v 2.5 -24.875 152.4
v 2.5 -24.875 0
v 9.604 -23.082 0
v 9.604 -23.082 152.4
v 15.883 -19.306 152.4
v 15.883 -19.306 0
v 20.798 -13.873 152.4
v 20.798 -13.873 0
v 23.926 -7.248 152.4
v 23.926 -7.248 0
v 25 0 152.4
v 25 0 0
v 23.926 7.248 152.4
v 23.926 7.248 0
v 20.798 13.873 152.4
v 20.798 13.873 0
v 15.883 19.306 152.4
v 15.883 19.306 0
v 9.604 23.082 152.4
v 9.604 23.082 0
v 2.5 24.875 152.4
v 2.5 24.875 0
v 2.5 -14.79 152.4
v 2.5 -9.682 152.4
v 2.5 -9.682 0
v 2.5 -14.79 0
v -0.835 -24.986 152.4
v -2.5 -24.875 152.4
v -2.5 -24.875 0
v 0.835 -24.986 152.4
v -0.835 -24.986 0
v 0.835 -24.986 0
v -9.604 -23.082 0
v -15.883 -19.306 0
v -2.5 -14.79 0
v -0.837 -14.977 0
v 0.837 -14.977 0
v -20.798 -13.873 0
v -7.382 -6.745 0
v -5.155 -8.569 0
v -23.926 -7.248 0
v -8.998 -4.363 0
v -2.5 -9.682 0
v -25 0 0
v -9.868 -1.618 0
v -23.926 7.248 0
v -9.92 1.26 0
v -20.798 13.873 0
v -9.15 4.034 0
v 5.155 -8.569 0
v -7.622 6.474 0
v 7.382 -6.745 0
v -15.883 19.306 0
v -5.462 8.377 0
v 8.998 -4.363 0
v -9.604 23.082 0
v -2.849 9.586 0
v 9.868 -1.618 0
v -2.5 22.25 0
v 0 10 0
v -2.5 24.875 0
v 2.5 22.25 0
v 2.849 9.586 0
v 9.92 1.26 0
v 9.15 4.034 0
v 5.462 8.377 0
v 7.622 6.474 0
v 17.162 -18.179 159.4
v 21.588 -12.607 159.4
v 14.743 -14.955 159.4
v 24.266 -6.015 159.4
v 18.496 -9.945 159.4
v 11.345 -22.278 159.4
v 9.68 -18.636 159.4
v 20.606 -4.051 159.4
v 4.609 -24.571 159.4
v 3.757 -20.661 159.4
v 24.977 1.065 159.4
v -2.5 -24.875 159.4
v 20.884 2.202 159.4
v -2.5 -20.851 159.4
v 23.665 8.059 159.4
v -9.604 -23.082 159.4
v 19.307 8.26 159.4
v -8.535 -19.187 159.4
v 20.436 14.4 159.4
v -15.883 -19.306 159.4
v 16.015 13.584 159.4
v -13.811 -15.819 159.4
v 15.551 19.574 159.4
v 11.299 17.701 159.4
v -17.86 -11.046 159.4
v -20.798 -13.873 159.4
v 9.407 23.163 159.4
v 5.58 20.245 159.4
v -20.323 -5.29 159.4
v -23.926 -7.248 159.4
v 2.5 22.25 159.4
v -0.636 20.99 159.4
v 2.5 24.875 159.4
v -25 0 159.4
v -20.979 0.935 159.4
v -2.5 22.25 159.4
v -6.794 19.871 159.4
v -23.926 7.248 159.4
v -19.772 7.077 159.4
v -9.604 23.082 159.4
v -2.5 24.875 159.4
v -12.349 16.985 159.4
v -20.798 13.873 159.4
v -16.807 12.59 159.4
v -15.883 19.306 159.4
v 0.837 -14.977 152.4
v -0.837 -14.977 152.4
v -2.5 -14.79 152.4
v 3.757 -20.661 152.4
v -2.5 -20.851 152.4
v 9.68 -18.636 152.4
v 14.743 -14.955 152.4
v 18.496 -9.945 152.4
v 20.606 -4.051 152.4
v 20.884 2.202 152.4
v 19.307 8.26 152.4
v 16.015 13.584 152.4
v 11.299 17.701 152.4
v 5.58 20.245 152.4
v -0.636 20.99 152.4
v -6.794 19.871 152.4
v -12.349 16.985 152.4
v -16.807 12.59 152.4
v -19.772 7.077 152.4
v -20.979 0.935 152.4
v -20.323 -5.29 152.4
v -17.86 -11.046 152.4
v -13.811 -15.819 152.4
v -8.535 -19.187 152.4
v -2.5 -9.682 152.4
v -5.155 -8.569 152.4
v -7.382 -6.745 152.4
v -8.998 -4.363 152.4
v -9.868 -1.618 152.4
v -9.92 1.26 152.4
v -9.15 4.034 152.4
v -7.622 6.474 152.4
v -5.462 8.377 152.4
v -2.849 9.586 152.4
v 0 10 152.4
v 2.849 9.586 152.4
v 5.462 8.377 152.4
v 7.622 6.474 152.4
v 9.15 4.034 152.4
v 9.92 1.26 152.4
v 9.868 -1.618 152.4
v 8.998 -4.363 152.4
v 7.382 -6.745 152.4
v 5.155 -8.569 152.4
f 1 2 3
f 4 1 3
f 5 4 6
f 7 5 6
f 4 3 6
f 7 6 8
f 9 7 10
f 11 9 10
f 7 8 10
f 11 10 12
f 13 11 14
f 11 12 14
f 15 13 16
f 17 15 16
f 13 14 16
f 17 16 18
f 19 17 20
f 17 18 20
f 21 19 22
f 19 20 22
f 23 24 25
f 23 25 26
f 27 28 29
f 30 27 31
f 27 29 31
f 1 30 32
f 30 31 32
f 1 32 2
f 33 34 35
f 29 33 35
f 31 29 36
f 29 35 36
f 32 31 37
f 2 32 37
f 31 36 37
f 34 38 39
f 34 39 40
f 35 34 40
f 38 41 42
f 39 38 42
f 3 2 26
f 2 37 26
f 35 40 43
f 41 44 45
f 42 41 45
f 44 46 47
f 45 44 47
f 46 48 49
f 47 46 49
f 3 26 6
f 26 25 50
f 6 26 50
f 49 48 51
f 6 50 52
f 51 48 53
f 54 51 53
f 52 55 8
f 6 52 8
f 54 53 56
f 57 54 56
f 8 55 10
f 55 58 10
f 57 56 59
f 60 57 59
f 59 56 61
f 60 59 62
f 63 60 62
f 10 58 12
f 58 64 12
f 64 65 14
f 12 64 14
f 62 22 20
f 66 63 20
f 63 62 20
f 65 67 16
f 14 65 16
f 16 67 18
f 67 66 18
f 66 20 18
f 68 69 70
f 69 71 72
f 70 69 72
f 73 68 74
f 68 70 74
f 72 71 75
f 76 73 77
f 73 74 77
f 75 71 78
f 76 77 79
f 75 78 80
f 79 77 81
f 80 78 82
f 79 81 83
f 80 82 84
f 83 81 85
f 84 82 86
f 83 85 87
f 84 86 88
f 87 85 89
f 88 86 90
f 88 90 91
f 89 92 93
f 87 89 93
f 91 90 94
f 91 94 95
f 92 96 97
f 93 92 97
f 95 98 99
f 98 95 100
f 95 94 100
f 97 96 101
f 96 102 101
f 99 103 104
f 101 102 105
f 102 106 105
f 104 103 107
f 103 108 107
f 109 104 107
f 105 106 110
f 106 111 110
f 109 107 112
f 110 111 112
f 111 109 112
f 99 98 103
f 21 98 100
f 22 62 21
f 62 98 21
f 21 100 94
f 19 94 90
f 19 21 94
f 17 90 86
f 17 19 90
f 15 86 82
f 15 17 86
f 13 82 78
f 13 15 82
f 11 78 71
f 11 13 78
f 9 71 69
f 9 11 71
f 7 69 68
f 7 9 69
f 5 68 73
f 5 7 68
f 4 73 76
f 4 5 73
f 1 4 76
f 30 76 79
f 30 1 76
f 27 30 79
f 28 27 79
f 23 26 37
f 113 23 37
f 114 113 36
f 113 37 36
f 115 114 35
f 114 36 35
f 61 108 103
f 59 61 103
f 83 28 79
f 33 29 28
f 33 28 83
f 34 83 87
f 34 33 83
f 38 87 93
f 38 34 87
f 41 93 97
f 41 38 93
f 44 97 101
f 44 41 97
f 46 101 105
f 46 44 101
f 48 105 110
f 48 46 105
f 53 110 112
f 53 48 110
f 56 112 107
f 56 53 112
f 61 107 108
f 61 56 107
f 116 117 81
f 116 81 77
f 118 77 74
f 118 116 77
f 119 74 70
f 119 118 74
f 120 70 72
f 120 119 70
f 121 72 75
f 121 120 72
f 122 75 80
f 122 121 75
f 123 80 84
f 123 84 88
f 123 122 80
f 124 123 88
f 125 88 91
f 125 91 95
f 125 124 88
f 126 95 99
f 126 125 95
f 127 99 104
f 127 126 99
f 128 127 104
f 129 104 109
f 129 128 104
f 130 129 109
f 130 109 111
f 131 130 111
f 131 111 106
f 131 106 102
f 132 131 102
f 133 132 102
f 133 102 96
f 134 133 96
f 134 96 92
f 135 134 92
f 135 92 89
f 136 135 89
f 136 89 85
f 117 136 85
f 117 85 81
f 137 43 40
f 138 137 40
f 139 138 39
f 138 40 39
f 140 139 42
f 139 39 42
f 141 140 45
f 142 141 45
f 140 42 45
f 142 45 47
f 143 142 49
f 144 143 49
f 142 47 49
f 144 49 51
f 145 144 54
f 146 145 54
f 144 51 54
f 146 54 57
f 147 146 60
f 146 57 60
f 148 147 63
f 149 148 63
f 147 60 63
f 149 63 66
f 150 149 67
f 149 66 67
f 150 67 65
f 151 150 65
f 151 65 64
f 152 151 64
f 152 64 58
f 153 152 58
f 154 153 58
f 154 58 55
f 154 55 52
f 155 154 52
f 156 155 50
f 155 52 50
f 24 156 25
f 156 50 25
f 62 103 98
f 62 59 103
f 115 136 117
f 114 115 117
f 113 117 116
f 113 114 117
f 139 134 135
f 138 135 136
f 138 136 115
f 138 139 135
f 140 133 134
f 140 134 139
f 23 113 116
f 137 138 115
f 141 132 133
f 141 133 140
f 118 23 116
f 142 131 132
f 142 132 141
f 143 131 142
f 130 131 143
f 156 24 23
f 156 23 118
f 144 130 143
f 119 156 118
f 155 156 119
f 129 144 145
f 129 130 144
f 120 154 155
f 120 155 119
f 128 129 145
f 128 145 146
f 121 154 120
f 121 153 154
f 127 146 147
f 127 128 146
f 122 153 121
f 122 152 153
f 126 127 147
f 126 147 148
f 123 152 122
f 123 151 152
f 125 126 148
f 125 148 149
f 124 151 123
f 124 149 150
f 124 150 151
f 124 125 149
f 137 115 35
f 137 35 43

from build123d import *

# Parameters (mm, degrees)
BOSS_EXTRUDE1_DEPTH = 152.4
SKETCH3_R           = 21
BOSS_EXTRUDE2_DEPTH = 7
BOSS_EXTRUDE3_START = -152.4
BOSS_EXTRUDE3_DEPTH = 152.4


with BuildPart() as part:
    # Sketch1 → Boss-Extrude1 (new body)
    with BuildSketch(Plane.XY):
        with BuildLine():
            Line((-2.5, 22.25), (-2.5, 24.874685928))
            ThreePointArc((-2.5, 24.874685928), (-25, 0), (-2.5, -24.874685928))
            Line((-2.5, -24.874685928), (-2.5, -9.682458366))
            ThreePointArc((-2.5, -9.682458366), (0, 10), (2.5, -9.682458366))
            Line((2.5, -9.682458366), (2.5, -24.874685928))
            ThreePointArc((2.5, -24.874685928), (25, 0), (2.5, 24.874685928))
            Line((2.5, 24.874685928), (2.5, 22.25))
            Line((2.5, 22.25), (-2.5, 22.25))
        make_face()
    extrude(amount=BOSS_EXTRUDE1_DEPTH)

    # Sketch3 → Boss-Extrude2 (add)
    with BuildSketch(Plane.XY.offset(152.4)):
        with BuildLine():
            Line((-2.5, 22.25), (2.5, 22.25))
            Line((2.5, 22.25), (2.5, 24.874685928))
            ThreePointArc((2.5, 24.874685928), (24.874685928, -2.5), (-2.5, -24.874685928))
            ThreePointArc((-2.5, -24.874685928), (-25, 0), (-2.5, 24.874685928))
            Line((-2.5, 24.874685928), (-2.5, 22.25))
        make_face()
        with Locations(Location((0, 0, 0), (0, 0, 263.162858832))):
            Circle(SKETCH3_R, mode=Mode.SUBTRACT)
    extrude(amount=BOSS_EXTRUDE2_DEPTH)

    # Sketch4 → Boss-Extrude3 (add)
    with BuildSketch(Plane.XY.offset(152.4).offset(BOSS_EXTRUDE3_START)):
        with BuildLine():
            Line((-2.5, -14.790199458), (-2.5, -24.874685928))
            ThreePointArc((-2.5, -24.874685928), (0, -25), (2.5, -24.874685928))
            Line((2.5, -24.874685928), (2.5, -14.790199458))
            ThreePointArc((2.5, -14.790199458), (0, -15), (-2.5, -14.790199458))
        make_face()
    extrude(amount=BOSS_EXTRUDE3_DEPTH)


solid = part.part
